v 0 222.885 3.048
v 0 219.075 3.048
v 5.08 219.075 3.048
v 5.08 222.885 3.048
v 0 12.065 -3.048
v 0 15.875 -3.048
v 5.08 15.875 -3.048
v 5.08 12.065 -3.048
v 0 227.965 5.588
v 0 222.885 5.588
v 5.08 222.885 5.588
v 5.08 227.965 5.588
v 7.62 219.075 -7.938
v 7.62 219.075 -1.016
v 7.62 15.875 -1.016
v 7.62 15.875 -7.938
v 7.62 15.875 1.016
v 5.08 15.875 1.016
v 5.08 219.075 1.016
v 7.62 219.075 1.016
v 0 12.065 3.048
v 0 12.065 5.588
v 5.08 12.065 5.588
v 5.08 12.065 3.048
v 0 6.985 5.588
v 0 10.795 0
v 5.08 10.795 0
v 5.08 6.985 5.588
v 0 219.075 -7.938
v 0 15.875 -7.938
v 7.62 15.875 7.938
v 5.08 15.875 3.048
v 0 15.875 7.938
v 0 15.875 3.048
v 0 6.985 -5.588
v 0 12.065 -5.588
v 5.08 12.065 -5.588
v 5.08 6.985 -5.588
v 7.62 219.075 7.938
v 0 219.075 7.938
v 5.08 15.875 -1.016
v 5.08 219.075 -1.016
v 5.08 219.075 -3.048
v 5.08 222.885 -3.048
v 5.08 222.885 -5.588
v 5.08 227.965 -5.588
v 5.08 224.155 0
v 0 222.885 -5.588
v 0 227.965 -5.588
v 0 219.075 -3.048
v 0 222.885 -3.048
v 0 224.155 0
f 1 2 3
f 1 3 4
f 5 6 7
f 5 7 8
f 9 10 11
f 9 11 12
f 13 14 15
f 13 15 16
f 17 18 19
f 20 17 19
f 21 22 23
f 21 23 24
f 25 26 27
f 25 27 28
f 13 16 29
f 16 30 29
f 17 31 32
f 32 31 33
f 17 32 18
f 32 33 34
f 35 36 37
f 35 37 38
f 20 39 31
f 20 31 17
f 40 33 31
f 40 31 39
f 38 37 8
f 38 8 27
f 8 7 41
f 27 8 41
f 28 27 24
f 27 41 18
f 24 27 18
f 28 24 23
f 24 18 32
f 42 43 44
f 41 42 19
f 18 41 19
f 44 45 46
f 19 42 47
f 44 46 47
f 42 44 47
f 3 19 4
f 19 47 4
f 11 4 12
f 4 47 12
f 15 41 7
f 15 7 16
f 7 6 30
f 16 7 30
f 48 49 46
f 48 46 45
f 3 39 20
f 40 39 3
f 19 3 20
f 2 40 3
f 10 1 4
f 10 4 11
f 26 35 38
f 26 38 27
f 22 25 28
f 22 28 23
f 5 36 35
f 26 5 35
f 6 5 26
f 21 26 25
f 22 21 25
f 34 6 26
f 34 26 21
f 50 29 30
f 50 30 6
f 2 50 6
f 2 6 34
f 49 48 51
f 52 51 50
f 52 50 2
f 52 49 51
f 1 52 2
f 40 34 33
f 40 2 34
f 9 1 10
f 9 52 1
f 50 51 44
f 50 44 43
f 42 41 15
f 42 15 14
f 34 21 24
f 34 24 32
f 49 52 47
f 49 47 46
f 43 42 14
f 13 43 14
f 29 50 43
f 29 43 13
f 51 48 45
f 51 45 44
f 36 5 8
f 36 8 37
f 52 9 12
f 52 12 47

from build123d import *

# Parameters (mm, degrees)
BOSS_EXTRUDE1_DEPTH = 5.08
SKETCH2_W           = 6.9215
SKETCH2_H           = 203.2
BOSS_EXTRUDE2_DEPTH = 2.54


with BuildPart() as part:
    # Sketch1 → Boss-Extrude1 (new body)
    with BuildSketch(Plane(origin=(0, 0, 0), x_dir=(0, 0, -1), z_dir=(1, 0, 0))):
        Polygon((-3.048, 15.875), (-7.9375, 15.875), (-7.9375, 219.075), (-3.048, 219.075), (-3.048, 222.885), (-5.588, 222.885), (-5.588, 227.965), (0, 224.155), (5.588, 227.965), (5.588, 222.885), (3.048, 222.885), (3.048, 219.075), (7.9375, 219.075), (7.9375, 15.875), (3.048, 15.875), (3.048, 12.065), (5.588, 12.065), (5.588, 6.985), (0, 10.795), (-5.588, 6.985), (-5.588, 12.065), (-3.048, 12.065), align=None)
    extrude(amount=BOSS_EXTRUDE1_DEPTH)

    # Sketch2 → Boss-Extrude2 (add)
    with BuildSketch(Plane(origin=(5.08, 0, 0), x_dir=(0, 0, -1), z_dir=(1, 0, 0))):
        with Locations((4.47675, 117.475)):
            Rectangle(SKETCH2_W, SKETCH2_H)
        with Locations((-4.47675, 117.475)):
            Rectangle(SKETCH2_W, SKETCH2_H)
    extrude(amount=BOSS_EXTRUDE2_DEPTH)


solid = part.part
